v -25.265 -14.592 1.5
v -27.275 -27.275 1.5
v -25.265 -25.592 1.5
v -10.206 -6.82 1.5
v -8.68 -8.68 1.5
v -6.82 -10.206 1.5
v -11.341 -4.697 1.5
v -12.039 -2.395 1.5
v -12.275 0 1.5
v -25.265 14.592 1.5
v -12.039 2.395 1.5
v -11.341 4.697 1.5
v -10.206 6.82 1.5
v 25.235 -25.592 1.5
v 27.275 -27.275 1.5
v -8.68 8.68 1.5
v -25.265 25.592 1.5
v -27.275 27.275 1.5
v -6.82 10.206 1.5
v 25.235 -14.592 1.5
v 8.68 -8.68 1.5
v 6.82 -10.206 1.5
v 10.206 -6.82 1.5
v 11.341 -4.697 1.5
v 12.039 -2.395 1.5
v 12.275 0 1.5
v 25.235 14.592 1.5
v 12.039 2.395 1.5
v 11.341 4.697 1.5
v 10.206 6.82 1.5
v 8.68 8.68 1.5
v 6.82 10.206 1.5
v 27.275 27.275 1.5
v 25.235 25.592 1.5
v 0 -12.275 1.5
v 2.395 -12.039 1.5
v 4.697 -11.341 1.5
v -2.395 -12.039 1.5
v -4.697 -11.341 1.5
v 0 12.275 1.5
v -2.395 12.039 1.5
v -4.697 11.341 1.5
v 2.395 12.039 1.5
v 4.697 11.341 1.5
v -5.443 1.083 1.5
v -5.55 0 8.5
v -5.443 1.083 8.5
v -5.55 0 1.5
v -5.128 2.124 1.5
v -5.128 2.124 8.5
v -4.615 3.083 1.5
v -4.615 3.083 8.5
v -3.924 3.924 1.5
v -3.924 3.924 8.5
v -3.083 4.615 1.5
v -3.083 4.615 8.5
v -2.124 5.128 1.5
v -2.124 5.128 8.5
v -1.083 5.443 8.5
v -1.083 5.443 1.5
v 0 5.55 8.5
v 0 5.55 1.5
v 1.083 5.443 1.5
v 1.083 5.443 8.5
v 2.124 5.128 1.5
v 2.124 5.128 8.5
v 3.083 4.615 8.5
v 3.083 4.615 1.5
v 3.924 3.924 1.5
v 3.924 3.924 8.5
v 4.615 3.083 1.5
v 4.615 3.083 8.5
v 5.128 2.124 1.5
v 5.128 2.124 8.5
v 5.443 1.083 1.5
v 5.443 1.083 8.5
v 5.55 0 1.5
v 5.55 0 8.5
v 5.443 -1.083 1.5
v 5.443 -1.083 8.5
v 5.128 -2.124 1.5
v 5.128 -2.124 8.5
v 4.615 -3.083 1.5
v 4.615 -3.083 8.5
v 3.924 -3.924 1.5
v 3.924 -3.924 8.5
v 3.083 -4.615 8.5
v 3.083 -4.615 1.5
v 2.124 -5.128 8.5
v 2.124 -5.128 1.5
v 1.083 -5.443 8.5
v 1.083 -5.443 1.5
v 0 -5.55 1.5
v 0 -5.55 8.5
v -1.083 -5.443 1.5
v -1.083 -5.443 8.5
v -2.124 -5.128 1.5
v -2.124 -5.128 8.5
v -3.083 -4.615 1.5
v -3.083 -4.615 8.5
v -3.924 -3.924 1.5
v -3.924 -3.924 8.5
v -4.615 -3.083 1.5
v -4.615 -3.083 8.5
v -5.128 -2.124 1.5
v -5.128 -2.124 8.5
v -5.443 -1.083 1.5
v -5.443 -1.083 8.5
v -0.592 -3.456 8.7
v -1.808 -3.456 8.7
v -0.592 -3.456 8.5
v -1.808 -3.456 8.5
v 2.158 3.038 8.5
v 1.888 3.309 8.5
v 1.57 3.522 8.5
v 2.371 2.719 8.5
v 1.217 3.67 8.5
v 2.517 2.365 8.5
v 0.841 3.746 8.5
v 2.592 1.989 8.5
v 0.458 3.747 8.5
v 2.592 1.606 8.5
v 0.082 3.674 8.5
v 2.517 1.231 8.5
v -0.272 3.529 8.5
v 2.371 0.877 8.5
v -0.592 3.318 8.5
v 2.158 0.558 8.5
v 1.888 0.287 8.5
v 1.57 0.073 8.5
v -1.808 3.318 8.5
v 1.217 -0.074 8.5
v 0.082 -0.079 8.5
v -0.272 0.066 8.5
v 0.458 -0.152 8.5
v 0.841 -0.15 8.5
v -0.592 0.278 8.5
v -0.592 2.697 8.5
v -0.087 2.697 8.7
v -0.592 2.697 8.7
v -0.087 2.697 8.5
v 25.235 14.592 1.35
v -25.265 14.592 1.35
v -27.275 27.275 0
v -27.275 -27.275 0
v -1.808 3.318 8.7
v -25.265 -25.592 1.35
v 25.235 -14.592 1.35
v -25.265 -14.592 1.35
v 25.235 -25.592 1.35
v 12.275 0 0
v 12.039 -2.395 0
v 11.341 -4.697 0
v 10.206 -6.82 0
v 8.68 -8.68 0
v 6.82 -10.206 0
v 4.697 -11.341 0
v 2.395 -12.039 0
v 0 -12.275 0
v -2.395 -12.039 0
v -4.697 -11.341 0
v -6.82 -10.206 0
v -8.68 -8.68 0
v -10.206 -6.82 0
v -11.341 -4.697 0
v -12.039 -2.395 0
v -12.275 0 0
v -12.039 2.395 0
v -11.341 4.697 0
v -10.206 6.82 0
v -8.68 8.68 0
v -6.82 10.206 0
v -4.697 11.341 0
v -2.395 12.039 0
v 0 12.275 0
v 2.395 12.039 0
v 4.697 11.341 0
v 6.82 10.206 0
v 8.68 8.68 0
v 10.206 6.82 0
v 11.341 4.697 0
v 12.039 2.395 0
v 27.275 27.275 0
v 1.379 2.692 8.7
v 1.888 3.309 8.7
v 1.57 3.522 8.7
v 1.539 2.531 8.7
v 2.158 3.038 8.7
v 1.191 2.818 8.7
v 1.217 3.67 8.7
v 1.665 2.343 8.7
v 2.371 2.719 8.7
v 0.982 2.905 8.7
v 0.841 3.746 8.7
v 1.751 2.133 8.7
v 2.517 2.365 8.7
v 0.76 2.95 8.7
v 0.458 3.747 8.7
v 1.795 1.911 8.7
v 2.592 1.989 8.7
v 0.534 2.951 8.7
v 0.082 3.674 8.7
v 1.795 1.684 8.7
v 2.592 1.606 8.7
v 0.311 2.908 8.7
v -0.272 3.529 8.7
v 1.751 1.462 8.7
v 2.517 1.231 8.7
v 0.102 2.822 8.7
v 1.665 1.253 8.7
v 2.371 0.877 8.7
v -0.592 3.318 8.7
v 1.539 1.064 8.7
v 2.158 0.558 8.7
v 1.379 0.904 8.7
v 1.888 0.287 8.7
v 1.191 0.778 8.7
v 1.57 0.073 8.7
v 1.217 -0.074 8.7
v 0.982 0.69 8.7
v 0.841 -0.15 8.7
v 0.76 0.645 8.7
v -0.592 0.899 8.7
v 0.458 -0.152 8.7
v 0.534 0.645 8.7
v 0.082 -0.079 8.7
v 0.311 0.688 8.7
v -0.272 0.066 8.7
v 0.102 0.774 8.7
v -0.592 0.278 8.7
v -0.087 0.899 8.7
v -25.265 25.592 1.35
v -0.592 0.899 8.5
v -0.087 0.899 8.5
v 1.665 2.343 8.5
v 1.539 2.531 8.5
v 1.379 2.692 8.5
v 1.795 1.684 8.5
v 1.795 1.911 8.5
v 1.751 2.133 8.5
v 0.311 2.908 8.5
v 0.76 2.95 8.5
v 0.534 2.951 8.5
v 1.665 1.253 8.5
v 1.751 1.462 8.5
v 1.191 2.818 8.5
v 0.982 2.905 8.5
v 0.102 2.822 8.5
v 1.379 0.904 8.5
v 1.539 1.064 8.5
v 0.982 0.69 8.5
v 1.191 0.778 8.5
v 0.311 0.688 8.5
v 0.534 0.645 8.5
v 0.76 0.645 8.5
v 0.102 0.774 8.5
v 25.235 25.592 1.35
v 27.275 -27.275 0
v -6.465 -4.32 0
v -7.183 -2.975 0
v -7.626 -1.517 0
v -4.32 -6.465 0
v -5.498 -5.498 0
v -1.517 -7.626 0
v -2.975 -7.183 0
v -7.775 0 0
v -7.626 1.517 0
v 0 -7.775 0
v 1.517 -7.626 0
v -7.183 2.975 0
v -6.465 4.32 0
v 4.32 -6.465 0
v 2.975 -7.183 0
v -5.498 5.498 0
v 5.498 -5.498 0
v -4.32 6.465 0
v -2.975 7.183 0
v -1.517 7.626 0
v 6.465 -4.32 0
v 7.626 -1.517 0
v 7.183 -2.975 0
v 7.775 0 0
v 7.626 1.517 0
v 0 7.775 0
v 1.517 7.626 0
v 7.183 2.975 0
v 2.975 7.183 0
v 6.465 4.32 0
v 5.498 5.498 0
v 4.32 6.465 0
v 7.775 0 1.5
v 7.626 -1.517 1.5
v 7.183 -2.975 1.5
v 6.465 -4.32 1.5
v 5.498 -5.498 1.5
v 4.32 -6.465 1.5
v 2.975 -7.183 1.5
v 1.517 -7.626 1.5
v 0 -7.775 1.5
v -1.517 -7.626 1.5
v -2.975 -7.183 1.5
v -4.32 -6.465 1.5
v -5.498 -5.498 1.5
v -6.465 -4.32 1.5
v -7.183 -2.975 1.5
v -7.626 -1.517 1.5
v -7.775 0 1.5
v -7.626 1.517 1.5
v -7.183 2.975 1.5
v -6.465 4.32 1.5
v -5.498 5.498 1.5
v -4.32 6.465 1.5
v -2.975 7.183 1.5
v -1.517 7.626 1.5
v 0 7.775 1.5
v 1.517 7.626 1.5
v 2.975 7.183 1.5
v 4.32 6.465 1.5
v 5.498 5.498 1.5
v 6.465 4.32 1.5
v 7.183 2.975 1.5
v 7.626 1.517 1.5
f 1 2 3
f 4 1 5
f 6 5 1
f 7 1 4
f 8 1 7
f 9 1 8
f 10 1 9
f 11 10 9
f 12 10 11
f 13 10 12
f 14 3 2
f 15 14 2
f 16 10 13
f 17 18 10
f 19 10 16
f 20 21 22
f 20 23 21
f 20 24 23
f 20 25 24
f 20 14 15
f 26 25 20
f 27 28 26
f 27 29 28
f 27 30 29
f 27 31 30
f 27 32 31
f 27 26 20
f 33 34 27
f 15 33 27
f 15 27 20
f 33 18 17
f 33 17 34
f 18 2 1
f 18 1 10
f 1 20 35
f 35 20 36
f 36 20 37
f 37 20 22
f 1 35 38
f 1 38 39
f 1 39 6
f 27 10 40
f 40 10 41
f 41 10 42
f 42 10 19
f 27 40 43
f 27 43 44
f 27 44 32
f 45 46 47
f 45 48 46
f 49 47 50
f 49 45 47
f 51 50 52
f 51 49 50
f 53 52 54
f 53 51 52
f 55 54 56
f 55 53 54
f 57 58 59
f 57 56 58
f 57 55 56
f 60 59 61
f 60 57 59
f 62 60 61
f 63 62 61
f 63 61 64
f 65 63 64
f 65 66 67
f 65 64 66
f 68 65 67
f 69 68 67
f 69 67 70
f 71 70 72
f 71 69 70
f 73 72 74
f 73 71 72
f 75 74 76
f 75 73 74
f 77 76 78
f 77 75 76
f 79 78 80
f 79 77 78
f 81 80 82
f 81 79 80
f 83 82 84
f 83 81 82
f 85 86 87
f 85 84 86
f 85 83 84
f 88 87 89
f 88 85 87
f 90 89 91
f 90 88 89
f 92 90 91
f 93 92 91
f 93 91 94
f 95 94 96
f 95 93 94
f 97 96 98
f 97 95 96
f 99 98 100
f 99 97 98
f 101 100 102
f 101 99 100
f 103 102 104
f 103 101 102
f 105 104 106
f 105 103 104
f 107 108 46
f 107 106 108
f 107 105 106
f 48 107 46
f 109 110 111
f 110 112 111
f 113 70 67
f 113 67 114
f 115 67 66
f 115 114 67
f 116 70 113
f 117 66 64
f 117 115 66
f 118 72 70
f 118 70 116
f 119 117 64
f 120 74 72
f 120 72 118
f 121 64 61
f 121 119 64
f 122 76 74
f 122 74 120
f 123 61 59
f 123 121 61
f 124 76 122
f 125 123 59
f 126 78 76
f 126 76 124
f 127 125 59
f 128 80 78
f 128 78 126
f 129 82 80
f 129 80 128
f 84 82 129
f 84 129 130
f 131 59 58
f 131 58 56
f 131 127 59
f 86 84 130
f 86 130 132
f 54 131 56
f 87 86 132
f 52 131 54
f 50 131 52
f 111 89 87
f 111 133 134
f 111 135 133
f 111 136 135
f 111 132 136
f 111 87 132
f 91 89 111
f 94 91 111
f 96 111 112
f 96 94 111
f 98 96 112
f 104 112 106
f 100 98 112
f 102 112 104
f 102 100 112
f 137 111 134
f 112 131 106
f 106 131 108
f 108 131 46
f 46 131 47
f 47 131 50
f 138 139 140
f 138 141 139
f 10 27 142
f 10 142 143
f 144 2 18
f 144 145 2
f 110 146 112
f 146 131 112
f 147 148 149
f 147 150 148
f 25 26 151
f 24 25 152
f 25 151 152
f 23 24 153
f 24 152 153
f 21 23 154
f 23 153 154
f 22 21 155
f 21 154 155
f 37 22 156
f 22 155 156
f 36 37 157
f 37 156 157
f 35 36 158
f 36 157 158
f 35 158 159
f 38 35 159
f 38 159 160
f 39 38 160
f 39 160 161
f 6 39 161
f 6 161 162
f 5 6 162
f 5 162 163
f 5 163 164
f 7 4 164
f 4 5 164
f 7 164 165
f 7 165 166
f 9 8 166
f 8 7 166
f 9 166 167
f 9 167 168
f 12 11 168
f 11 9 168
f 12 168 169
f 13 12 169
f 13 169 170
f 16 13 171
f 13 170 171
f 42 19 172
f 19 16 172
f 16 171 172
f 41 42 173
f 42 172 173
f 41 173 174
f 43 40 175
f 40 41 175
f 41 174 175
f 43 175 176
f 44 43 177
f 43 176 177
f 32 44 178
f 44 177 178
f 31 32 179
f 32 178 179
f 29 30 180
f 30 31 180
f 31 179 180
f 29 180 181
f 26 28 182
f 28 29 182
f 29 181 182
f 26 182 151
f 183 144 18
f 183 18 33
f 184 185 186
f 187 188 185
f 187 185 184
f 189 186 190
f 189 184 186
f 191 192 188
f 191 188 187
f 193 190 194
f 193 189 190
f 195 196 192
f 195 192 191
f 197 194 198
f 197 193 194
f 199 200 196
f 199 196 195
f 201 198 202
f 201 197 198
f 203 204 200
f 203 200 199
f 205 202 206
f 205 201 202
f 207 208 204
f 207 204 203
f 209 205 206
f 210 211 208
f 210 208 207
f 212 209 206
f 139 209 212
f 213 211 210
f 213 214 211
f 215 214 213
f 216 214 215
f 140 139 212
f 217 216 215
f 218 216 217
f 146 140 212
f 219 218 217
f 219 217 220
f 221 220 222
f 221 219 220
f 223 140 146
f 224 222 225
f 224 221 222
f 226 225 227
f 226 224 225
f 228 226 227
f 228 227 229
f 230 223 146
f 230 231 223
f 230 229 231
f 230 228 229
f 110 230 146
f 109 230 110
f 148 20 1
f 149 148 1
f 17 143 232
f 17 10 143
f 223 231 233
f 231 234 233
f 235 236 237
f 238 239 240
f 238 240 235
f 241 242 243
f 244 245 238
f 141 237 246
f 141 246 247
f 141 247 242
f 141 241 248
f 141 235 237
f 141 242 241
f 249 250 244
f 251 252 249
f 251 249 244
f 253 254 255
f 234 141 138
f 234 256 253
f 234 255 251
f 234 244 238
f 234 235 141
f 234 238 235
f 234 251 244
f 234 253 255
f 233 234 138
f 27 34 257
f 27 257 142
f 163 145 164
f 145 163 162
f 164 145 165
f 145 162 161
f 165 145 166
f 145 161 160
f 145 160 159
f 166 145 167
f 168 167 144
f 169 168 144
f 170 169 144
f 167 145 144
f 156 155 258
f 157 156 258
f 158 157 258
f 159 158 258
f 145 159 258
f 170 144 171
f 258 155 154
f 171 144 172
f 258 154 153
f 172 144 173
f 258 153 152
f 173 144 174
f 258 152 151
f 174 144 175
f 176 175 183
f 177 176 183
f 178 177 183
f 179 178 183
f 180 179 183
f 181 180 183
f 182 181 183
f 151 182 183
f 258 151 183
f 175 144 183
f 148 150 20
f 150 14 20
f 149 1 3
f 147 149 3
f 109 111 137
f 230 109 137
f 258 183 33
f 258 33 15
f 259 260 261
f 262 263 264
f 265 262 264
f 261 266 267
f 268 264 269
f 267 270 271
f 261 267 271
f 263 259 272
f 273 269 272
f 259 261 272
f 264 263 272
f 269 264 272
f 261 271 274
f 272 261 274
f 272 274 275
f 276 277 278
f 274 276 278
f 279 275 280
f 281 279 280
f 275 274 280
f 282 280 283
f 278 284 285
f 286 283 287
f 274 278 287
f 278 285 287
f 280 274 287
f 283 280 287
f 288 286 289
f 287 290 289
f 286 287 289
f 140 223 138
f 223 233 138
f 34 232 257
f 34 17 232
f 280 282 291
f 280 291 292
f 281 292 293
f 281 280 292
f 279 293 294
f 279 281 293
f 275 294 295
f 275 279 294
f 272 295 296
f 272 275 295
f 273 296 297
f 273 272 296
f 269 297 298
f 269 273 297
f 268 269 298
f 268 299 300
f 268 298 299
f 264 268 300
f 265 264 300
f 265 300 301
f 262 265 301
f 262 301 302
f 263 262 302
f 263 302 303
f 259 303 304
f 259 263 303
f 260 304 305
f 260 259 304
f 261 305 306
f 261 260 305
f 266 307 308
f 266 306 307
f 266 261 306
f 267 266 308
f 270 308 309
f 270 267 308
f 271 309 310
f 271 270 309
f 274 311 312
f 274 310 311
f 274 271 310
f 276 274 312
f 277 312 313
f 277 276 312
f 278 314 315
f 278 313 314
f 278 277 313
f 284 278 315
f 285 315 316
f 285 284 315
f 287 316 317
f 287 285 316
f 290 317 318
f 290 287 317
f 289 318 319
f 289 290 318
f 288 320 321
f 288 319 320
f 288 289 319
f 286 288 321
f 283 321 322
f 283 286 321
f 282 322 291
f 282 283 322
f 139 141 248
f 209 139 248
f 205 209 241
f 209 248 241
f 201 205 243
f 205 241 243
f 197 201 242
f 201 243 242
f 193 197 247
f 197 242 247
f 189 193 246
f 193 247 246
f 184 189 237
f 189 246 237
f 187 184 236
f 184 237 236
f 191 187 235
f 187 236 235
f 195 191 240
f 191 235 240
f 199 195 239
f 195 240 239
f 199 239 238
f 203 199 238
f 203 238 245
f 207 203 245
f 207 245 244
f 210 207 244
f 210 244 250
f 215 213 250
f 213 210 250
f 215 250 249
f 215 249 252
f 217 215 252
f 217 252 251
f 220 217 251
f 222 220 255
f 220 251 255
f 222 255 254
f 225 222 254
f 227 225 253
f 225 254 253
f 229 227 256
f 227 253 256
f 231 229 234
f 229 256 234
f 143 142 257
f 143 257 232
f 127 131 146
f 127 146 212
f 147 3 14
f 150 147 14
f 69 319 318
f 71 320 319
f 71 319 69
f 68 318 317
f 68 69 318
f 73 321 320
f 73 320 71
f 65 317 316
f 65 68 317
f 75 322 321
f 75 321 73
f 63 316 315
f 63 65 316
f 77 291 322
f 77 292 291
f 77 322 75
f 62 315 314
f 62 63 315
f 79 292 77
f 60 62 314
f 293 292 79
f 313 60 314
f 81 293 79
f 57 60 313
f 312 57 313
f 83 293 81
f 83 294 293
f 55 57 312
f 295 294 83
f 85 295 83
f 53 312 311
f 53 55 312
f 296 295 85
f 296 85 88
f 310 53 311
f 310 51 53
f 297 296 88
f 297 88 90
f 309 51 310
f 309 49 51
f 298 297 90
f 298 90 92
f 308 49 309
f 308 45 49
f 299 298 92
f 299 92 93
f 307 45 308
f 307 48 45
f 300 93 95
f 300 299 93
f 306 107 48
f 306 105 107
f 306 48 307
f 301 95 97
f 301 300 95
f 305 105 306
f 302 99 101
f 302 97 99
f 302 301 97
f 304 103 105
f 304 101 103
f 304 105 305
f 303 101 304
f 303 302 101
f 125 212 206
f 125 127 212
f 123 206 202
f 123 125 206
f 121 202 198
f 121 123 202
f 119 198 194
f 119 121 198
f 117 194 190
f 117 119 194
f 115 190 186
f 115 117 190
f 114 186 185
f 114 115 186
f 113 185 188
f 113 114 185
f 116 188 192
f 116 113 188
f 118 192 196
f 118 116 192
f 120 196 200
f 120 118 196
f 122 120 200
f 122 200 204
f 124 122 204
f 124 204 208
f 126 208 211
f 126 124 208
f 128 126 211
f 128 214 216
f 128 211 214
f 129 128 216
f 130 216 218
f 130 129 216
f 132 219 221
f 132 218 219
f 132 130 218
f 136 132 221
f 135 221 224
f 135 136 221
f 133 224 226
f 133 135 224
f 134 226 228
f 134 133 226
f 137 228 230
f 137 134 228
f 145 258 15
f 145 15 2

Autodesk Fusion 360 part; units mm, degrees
sketch "Sketch1" plane through (0, 0, 0) normal (0, 0, 1) x (1, 0, 0)
  circle A0 centre (0, 0) radius 7.775
  circle A1 centre (0, 0) radius 12.275
  line L0 (0, 12.275) -> (0, 27.275)
  line L1 (-12.275, 0) -> (-27.275, 0)
  line L2 (-27.275, 0) -> (-27.275, 27.275)
  line L3 (-27.275, 27.275) -> (27.275, 27.275)
  line L4 (27.275, 27.275) -> (27.275, -27.275)
  line L5 (27.275, -27.275) -> (-27.275, -27.275)
  line L6 (-27.275, -27.275) -> (-27.275, 27.275)
  dimension "d1" = 15.55
  dimension "d2" = 4.5
  dimension "d3" = 15
  dimension "d4" = 15
  dimension "d5" = 54.55
  dimension "d6" = 54.55
extrude "Extrude1" add sketch "Sketch1" along normal blind 1.5 contours A0 | A1 L0 L1 L3 L4 L5 L6 | A1 L0 L1 L2 L3 L6 makes body 1 at (-0.3058, -22.2636, 0) makes body 2 at (-1.6159, 2.7988, 0)
sketch "Sketch2" plane through (0, 0, 1.5) normal (0, 0, 1) x (-1, 0, 0)
  circle A0 centre (0, 0) radius 7.775
  line L0 (5.0002, -4.6813) -> (-4.9998, -4.6813)
  line L1 (-4.9998, -4.6813) -> (-4.9998, 4.8187)
  line L2 (-4.9998, 4.8187) -> (5.0002, 4.8187)
  line L3 (5.0002, 4.8187) -> (5.0002, -4.6813)
  line L4 (25.2649, -25.5924) -> (-25.2351, -25.5924)
  line L5 (-25.2351, -25.5924) -> (-25.2351, -14.5924)
  line L6 (-25.2351, -14.5924) -> (25.2649, -14.5924)
  line L7 (25.2649, -14.5924) -> (25.2649, -25.5924)
  line L8 (0, 0) -> (-1.8837, 0)
  line L9 (25.2649, 25.5924) -> (-25.2351, 25.5924)
  line L10 (-25.2351, 25.5924) -> (-25.2351, 14.5924)
  line L11 (-25.2351, 14.5924) -> (25.2649, 14.5924)
  line L12 (25.2649, 14.5924) -> (25.2649, 25.5924)
  dimension "d9" = 10
  dimension "d10" = 9.5
  dimension "d11" = 50.5
  dimension "d12" = 11
extrude "Extrude2" cut sketch "Sketch2" against normal blind 0.15 contours L0 L1 L2 L3 | L4 L5 L6 L7 | L9 L10 L11 L12 bodies 1 2
extrude "Extrude3" add 1 faces at (-1.6669, 1.5146, 1.35) along direction (0, 0, 1) blind 0.15 on bodies 2 bodies 2
sketch "Sketch3" plane through (0, 0, 1.5) normal (0, 0, 1) x (-1, 0, 0)
  circle A0 centre (0, 0) radius 7.775
  circle A1 centre (0, 0) radius 5.55
  dimension "d17" = 11.1
extrude "Extrude4" add sketch "Sketch3" along normal blind 7 contours A1 bodies 2
sketch "Sketch4" plane through (0, 0, 8.5) normal (0, 0, 1) x (-1, 0, 0)
  circle A0 centre (0, 0) radius 5.55
  line L0 (1.8078, -3.3179) -> (1.8078, 3.4555)
  line L1 (1.8078, 3.4555) -> (0.5916, 3.4555)
  line L2 (0.5916, 3.4555) -> (0.5916, -0.2775)
  line L3 (1.8078, -3.3179) -> (0.5916, -3.3179)
  line L4 (0.5916, -0.2775) -> (0.5916, -3.3179)
  arc A1 (0.5916, -0.2775) -> (0.5916, -3.3179) centre (-0.6427, -1.7977) ccw
  arc A2 (0.0874, -0.8986) -> (0.0874, -2.6969) centre (-0.6427, -1.7977) ccw
  line L5 (0.0874, -0.8986) -> (0.5916, -0.8986)
  line L6 (0.0874, -2.6969) -> (0.5916, -2.6969)
  dimension "d20" = -0.8
extrude "Extrude5" add sketch "Sketch4" along normal blind 0.2 contours L0 L1 L2 L3 L4 | L4 A1 A2 L5 L6 bodies 2
equation "d1 = 11.05 mm + 4.5 mm"
